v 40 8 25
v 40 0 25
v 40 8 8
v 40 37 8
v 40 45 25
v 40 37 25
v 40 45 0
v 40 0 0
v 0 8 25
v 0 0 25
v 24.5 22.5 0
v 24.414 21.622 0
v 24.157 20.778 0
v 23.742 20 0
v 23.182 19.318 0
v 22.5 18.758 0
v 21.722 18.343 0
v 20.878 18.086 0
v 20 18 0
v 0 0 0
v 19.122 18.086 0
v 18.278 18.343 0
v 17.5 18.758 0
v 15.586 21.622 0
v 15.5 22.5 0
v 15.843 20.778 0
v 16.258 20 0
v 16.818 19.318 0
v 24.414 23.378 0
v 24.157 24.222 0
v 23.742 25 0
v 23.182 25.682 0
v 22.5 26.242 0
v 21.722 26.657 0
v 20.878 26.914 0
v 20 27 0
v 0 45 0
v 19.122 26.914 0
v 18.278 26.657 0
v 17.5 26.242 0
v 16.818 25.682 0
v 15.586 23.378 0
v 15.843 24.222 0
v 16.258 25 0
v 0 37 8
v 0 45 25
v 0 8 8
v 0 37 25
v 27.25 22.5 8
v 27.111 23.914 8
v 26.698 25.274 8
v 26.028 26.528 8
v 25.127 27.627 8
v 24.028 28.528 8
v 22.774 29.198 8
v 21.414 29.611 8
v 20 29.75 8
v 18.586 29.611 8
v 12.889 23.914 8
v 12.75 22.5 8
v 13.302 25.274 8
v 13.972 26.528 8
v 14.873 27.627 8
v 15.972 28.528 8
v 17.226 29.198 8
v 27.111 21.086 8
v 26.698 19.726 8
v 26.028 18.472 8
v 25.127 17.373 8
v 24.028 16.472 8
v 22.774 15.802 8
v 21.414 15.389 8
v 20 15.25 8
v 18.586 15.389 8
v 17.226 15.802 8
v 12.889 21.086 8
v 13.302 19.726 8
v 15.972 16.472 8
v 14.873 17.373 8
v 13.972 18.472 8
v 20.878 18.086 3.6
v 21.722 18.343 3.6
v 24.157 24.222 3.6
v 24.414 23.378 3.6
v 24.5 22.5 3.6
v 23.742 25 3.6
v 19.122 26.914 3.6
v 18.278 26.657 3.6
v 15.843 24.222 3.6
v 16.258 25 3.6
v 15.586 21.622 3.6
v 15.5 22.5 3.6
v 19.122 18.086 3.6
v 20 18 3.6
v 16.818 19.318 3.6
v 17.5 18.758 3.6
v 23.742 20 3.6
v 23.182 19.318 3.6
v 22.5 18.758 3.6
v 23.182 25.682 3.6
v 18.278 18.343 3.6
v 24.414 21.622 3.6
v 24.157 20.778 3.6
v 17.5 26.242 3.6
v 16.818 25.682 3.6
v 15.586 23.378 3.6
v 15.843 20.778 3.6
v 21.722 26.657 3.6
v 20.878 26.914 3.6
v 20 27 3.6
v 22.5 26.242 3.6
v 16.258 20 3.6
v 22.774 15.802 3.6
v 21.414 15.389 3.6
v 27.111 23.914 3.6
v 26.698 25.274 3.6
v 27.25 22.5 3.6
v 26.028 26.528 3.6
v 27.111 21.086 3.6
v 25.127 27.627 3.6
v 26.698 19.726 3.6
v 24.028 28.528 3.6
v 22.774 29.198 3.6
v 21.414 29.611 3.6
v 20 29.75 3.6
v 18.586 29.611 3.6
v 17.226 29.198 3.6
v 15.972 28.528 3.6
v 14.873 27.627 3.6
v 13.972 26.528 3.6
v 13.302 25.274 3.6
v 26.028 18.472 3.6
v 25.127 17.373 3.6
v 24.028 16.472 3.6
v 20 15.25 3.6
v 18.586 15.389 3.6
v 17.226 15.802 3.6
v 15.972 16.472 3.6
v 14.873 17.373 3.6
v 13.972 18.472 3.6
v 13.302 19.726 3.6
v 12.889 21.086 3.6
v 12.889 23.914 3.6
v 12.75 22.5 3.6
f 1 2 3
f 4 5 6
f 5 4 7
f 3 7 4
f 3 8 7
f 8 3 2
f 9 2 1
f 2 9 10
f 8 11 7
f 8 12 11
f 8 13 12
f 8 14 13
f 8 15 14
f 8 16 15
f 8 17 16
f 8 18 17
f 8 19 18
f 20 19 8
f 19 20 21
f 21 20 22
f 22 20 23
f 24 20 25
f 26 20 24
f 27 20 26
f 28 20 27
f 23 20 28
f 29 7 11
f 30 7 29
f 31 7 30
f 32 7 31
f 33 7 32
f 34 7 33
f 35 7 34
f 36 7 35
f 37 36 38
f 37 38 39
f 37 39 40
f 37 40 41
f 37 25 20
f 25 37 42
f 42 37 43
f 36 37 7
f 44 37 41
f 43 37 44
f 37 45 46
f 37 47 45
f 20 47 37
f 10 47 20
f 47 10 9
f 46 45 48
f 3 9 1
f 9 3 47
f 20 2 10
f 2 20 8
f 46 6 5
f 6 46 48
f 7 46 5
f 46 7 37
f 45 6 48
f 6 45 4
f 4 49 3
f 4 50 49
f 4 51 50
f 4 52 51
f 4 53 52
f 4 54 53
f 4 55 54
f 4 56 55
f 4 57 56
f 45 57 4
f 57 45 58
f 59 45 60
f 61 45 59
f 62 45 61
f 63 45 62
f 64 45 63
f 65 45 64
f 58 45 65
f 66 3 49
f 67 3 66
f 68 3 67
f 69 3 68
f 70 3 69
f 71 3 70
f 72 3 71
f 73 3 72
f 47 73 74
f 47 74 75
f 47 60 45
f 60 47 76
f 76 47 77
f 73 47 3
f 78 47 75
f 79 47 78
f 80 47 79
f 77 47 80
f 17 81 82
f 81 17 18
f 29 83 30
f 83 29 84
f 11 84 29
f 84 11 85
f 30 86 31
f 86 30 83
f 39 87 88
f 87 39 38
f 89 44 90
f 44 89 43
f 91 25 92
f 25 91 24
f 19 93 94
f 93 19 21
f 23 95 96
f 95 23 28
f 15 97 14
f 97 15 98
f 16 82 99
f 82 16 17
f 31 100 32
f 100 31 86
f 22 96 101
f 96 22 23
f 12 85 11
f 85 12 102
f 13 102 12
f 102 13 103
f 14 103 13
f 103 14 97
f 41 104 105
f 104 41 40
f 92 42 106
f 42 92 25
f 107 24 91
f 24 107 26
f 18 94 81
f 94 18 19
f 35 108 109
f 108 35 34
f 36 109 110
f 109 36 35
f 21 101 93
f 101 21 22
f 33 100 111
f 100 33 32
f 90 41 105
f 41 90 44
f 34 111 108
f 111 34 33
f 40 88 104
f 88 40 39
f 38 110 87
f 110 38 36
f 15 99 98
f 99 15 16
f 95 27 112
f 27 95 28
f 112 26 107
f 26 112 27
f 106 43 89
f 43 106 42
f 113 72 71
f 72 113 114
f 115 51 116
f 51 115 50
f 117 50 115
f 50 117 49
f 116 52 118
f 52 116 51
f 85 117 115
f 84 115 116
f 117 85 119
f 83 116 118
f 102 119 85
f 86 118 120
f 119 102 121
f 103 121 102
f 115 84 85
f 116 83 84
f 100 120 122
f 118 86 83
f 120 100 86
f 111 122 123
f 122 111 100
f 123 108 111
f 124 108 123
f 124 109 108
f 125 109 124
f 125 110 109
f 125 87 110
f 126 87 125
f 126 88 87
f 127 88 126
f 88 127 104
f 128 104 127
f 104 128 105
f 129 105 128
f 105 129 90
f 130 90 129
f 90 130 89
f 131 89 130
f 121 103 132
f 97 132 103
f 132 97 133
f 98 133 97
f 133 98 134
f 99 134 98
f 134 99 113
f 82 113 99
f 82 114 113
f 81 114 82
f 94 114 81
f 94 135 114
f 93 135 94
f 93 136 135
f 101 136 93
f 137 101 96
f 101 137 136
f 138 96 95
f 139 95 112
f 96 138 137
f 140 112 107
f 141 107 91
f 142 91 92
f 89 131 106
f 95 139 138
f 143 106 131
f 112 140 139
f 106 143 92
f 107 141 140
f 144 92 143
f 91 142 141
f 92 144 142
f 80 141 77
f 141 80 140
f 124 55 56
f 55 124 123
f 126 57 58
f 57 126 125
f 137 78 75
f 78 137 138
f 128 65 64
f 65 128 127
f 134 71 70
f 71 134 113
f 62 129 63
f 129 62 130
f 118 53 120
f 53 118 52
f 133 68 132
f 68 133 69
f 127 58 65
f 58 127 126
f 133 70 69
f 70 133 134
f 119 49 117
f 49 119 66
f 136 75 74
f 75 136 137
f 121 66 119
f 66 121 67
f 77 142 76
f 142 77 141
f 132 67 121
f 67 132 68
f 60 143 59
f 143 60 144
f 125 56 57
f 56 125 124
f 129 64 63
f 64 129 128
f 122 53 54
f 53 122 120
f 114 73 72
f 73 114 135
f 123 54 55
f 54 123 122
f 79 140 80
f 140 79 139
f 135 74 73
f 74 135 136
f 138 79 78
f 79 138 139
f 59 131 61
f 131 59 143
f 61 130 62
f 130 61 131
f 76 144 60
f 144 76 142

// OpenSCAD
$fn = 32;

// ----------------------------------------------------------------------
// U-bracket: 40 x 45 x 25 mm
// ----------------------------------------------------------------------

// --- parameters (mm) ---
base_len = 40;            // outer length, X
channel_w = 45;           // outer width, Y
upright_h = 25;           // upright height, Z
mat_t = 8;                // wall thickness
hole_d = 9;               // clearance for M8
cb_d = 14.5;              // counterbore diameter
cb_h = 4.4;               // counterbore depth

module hole_z(px, py) {
  translate([px, py, -0.5]) cylinder(h = mat_t + 1, d = hole_d);
}
module hole_y_pz(pz) {
  /* through both uprights along Y */
  translate([0, -0.5, pz]) rotate([-90, 0, 0]) cylinder(h = channel_w + 1, d = hole_d);
}
module cb_z(px, py) {
  translate([px, py, mat_t - cb_h]) cylinder(h = cb_h + 0.4, d = cb_d);
}

module base() {
  cube([base_len, channel_w, mat_t]);
}

module uprights() {
  cube([base_len, mat_t, upright_h]);
  translate([0, channel_w - mat_t, 0]) cube([base_len, mat_t, upright_h]);
}

difference() {
  union() {
    base();
    uprights();
  }
  hole_z(20, 22.5);
  cb_z(20, 22.5);
}
